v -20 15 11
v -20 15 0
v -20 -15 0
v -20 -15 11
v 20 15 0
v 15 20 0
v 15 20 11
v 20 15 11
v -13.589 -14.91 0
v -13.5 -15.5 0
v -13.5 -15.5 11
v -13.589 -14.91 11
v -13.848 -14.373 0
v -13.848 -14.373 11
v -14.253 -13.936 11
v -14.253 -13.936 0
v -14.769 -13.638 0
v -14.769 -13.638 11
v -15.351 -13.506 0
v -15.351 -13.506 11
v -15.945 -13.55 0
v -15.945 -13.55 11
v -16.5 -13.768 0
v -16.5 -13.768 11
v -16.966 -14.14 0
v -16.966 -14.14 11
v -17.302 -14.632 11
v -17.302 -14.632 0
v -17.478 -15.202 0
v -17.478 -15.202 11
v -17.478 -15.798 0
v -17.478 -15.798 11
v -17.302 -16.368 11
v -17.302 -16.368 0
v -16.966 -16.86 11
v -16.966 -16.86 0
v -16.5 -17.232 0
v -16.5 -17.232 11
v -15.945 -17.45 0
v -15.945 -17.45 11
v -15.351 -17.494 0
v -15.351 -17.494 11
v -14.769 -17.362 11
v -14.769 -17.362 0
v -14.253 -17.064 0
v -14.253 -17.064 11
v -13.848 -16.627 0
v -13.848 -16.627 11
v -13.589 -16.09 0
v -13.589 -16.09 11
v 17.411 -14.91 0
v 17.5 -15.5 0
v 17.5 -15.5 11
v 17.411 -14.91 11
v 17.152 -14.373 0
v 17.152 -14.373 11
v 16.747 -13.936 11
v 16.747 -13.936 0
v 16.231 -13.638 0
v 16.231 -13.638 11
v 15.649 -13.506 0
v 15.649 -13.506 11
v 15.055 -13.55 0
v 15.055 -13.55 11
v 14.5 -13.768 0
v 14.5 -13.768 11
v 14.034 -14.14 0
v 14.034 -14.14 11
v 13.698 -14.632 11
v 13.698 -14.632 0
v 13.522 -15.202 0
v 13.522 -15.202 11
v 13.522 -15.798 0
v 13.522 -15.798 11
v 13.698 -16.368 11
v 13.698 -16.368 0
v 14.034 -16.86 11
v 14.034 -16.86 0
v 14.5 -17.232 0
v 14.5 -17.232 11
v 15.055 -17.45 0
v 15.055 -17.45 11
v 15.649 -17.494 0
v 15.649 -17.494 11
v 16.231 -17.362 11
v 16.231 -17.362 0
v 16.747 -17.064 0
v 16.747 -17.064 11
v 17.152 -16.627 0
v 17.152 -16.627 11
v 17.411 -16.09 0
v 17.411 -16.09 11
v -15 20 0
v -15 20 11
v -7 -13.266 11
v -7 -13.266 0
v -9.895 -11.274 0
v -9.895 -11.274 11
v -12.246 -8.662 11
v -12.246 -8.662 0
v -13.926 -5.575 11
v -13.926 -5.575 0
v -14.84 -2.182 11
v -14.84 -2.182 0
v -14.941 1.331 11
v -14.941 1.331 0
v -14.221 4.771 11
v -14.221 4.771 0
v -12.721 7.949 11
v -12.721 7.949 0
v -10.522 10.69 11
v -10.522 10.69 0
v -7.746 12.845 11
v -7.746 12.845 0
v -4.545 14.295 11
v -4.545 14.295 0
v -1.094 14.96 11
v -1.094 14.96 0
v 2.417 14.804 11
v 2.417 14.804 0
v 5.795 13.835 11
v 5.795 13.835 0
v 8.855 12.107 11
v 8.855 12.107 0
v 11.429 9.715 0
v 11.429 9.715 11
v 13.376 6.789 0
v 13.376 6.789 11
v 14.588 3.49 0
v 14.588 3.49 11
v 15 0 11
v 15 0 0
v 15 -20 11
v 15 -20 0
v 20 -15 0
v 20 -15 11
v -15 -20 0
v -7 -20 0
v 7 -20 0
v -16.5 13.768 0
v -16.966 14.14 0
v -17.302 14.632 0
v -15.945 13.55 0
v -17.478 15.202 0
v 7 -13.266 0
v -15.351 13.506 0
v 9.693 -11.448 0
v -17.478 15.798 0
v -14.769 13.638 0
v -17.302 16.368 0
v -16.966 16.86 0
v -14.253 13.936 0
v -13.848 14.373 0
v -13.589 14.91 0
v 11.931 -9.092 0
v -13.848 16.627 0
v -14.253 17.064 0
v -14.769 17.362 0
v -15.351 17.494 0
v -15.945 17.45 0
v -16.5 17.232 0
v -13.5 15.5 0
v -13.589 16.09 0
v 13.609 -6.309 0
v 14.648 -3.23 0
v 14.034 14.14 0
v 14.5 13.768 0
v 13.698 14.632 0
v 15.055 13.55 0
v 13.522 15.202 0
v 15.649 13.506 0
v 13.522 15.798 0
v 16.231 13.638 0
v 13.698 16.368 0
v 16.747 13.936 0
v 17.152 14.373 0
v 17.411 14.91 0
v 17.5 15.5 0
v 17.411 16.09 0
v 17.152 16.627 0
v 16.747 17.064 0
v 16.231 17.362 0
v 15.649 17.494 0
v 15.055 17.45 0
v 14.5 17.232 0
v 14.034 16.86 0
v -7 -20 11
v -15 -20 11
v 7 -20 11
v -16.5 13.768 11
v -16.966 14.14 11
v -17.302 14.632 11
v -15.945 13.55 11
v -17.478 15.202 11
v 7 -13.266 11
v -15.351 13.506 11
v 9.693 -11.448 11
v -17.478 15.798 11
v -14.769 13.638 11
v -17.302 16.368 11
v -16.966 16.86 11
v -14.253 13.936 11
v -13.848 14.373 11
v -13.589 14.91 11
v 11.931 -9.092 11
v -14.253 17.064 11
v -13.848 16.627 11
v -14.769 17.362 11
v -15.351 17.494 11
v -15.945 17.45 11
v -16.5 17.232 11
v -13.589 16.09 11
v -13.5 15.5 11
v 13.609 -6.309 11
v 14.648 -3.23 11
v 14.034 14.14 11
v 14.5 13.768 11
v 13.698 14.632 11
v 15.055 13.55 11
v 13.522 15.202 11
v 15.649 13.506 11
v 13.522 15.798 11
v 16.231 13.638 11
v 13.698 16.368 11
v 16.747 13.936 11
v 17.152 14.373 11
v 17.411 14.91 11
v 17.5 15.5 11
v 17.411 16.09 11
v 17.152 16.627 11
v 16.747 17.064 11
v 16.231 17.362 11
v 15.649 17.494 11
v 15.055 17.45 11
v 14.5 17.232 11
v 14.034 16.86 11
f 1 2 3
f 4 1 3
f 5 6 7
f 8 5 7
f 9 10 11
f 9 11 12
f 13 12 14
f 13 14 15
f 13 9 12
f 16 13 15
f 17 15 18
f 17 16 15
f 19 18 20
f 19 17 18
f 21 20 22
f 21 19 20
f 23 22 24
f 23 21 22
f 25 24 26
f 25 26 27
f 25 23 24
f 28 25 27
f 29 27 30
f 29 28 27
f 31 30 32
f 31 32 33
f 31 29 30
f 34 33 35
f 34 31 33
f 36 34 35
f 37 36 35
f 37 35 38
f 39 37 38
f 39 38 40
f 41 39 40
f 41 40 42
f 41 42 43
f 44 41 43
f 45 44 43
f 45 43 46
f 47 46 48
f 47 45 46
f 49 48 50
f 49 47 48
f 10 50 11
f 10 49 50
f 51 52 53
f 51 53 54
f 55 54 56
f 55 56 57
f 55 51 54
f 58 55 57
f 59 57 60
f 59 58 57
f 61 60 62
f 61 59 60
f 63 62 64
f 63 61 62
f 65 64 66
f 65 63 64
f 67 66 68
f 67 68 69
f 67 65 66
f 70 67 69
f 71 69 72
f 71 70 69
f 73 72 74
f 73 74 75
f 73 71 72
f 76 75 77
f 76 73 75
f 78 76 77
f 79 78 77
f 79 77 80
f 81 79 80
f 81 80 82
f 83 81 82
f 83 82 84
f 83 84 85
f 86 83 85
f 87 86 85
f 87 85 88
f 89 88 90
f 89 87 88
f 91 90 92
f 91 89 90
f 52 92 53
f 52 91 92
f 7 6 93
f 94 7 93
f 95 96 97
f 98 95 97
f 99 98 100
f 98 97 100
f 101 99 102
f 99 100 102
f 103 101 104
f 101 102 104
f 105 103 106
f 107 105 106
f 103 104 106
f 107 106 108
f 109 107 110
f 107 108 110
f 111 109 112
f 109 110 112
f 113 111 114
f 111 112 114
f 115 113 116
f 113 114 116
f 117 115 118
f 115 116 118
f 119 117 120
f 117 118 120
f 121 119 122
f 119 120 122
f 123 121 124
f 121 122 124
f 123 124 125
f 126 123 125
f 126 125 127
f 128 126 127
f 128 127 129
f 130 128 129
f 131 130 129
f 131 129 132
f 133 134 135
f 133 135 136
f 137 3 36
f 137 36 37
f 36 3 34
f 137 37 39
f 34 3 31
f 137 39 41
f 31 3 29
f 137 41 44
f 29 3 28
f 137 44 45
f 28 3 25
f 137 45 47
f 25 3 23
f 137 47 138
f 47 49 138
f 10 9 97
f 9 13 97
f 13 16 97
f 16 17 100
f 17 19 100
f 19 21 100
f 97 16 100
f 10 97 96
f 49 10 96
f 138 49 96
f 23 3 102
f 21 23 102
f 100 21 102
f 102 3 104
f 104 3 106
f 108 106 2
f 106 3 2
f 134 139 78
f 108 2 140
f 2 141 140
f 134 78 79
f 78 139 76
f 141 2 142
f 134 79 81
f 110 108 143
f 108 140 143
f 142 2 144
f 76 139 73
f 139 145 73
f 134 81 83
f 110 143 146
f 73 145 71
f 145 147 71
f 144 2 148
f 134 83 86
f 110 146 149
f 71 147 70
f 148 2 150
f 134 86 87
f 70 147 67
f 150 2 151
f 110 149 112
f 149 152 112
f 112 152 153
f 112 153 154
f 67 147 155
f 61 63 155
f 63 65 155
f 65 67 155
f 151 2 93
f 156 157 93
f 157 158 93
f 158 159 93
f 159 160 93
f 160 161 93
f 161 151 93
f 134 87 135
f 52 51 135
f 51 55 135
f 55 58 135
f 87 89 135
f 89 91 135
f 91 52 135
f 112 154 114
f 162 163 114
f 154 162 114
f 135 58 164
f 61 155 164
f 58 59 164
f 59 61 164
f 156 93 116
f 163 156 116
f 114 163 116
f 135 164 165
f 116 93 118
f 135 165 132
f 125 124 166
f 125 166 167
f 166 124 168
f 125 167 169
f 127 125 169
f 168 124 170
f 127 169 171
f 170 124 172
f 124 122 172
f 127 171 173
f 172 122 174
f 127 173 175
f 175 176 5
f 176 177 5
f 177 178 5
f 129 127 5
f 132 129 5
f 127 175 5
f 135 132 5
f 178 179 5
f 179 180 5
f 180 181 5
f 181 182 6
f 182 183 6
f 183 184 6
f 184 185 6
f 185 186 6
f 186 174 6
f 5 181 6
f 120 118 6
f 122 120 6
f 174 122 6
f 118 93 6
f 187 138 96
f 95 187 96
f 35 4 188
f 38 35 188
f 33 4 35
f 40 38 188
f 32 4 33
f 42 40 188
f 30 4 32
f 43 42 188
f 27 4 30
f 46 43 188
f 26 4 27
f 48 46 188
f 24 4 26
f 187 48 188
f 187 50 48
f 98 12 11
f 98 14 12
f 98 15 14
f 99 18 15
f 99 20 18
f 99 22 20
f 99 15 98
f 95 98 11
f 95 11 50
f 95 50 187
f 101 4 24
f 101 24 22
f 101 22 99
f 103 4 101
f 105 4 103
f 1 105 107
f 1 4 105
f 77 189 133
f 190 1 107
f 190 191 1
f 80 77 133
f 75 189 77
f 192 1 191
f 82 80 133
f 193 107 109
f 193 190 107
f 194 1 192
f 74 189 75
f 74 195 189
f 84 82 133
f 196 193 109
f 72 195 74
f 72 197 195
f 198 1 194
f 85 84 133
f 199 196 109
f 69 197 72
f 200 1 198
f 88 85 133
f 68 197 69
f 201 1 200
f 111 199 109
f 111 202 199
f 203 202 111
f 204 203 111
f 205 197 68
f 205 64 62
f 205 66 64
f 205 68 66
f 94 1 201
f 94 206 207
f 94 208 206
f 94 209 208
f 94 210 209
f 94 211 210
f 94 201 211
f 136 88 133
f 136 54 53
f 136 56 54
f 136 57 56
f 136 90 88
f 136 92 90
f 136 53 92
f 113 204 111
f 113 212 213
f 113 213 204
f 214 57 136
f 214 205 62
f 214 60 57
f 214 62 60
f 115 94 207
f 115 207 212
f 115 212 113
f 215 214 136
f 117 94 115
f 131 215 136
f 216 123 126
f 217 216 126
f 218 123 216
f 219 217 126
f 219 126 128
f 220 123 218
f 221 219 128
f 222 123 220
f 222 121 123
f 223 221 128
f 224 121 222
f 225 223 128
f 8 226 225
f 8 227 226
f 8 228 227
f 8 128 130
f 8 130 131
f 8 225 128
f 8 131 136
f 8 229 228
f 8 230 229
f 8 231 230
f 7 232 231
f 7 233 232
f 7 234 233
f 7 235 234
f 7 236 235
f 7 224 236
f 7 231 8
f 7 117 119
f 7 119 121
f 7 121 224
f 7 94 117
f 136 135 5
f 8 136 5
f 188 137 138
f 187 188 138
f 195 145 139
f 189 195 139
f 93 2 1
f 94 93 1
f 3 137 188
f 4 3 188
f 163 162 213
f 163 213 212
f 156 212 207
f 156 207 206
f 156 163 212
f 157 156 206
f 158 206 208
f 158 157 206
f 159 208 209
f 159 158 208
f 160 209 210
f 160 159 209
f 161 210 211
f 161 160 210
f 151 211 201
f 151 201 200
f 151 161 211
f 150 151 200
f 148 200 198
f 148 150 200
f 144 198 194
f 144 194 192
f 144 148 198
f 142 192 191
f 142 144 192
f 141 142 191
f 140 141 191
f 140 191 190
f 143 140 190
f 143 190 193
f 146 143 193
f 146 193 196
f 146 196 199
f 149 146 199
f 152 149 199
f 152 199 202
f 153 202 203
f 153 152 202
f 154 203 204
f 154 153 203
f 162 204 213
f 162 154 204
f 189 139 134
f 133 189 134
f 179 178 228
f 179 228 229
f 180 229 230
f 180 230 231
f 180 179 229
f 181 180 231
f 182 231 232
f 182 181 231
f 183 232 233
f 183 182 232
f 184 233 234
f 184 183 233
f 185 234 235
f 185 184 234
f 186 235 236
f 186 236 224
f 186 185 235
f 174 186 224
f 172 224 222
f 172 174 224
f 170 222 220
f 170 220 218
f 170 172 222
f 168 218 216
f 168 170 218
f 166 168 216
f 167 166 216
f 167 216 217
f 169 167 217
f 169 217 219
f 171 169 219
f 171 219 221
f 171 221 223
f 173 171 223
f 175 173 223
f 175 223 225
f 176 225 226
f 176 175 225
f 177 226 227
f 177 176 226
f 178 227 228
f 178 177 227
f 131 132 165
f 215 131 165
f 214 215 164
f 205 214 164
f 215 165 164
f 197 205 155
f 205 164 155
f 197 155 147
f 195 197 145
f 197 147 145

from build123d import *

# Parameters (mm, degrees)
F0_R     = 2
F1_DEPTH = 11
F2_SIZE  = 5


with BuildPart() as f1:
    # F0 (on Top) → F1 (new body)
    with BuildSketch(Plane.XY):
        with BuildLine():
            Line((20, -20), (20, 20))
            Line((20, 20), (-20, 20))
            Line((-20, 20), (-20, -20))
            Line((-20, -20), (-7, -20))
            Line((-7, -20), (-7, -13.266499))
            ThreePointArc((-7, -13.266499), (-7.745967, 12.845233), (15, 0))
            ThreePointArc((15, 0), (12.845233, -7.745967), (7, -13.266499))
            Line((7, -13.266499), (7, -20))
            Line((7, -20), (20, -20))
        make_face()
        with Locations((-15.5, -15.5)):
            Circle(F0_R, mode=Mode.SUBTRACT)
        with Locations((15.5, -15.5)):
            Circle(F0_R, mode=Mode.SUBTRACT)
        with Locations((-15.5, 15.5)):
            Circle(F0_R, mode=Mode.SUBTRACT)
        with Locations((15.5, 15.5)):
            Circle(F0_R, mode=Mode.SUBTRACT)
    extrude(amount=F1_DEPTH)

    # F2
    f2_edges = [f1.edges().sort_by_distance(p)[0] for p in [
        (-20, -20, 5.5),
        (-20, 20, 5.5),
        (20, 20, 5.5),
        (20, -20, 5.5),
    ]]
    chamfer(f2_edges, length=F2_SIZE)


solid = f1.part
